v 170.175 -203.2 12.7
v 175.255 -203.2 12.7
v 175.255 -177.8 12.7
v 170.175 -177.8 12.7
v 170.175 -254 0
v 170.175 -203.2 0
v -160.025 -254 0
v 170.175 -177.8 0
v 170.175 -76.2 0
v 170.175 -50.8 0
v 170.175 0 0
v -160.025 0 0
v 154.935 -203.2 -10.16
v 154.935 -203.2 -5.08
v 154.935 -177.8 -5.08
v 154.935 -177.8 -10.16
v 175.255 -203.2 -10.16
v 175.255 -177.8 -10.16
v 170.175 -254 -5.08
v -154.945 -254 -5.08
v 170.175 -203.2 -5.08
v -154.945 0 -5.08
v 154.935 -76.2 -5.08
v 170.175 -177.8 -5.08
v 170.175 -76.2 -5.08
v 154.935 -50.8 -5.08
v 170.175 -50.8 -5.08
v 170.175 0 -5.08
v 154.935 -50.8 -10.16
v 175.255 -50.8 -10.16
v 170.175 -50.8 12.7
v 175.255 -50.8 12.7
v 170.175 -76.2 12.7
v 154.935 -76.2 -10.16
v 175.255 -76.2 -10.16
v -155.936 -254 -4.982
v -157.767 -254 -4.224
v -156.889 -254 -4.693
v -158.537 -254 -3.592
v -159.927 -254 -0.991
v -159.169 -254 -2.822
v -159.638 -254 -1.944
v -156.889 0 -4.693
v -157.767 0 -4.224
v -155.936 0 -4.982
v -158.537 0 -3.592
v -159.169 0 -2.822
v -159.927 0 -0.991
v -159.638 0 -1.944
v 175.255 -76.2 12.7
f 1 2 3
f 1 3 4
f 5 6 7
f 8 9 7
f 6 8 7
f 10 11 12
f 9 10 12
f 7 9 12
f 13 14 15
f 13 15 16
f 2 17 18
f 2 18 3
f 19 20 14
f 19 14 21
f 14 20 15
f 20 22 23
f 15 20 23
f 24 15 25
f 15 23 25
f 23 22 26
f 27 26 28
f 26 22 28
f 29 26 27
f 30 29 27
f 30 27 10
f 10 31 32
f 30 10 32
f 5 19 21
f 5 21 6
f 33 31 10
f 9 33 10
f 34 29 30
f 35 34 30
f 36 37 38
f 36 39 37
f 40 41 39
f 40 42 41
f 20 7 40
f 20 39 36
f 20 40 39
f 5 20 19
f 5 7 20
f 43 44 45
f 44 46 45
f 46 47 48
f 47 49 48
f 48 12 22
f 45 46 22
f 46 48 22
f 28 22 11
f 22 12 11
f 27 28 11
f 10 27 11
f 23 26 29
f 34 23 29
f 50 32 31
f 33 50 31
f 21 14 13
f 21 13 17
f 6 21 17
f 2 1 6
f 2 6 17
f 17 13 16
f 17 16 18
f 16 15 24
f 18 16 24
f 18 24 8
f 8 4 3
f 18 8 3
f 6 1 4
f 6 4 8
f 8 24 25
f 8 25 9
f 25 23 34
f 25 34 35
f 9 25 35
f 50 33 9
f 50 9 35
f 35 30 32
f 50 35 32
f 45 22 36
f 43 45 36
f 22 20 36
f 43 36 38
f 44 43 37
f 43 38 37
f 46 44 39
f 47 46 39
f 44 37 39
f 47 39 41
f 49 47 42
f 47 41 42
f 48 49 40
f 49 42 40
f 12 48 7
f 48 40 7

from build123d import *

# Parameters (mm, degrees)
F0_W     = 330.2
F0_H     = 5.08
F1_DEPTH = 50.8
F3_DEPTH = 25.4
F5_DEPTH = 101.6
F7_DEPTH = 25.4
F9_DEPTH = 50.8
F10_R    = 5.07999


# Not quite as in the source:
# - a fillet or chamfer is up to 0.001 mm smaller than in the source, because OpenCascade refuses the exact size


with BuildPart() as f1:
    # F0 (on Front) → F1 (new body)
    with BuildSketch(Plane.XZ):
        with Locations((5.0749575138, -2.54)):
            Rectangle(F0_W, F0_H)
    extrude(amount=F1_DEPTH)

    # F2 (on face) → F3 (join)
    with BuildSketch(Plane.XZ.offset(50.8)):
        Polygon((170.1749575138, -5.08), (170.1749575138, 0), (-160.0250424862, 0), (-160.0250424862, -5.08), (154.9349575138, -5.08), align=None)
        Polygon((170.1749575138, 12.7), (170.1749575138, 0), (170.1749575138, -5.08), (154.9349575138, -5.08), (154.9349575138, -10.16), (175.2549575138, -10.16), (175.2549575138, 12.7), align=None)
    extrude(amount=F3_DEPTH)

    # F4 (on face) → F5 (join)
    with BuildSketch(Plane.XZ.offset(76.2)):
        Polygon((170.1749575138, 0), (-160.0250424862, 0), (-160.0250424862, -5.08), (154.9349575138, -5.08), (170.1749575138, -5.08), align=None)
    extrude(amount=F5_DEPTH)

    # F6 (on face) → F7 (join)
    with BuildSketch(Plane.XZ.offset(177.8)):
        Polygon((170.1749575138, -5.08), (170.1749575138, 0), (-160.0250424862, 0), (-160.0250424862, -5.08), (154.9349575138, -5.08), align=None)
        Polygon((170.1749575138, 12.7), (170.1749575138, 0), (170.1749575138, -5.08), (154.9349575138, -5.08), (154.9349575138, -10.16), (175.2549575138, -10.16), (175.2549575138, 12.7), align=None)
    extrude(amount=F7_DEPTH)

    # F8 (on face) → F9 (join)
    with BuildSketch(Plane.XZ.offset(203.2)):
        Polygon((170.1749575138, 0), (-160.0250424862, 0), (-160.0250424862, -5.08), (154.9349575138, -5.08), (170.1749575138, -5.08), align=None)
    extrude(amount=F9_DEPTH)

    # F10 (radius 5.08 in the source; OpenCascade refuses exactly that, so slightly less here)
    f10_edges = [f1.edges().sort_by_distance(p)[0] for p in [
        (-160.025042, -127, -5.08),
    ]]
    fillet(f10_edges, radius=F10_R)


solid = f1.part
